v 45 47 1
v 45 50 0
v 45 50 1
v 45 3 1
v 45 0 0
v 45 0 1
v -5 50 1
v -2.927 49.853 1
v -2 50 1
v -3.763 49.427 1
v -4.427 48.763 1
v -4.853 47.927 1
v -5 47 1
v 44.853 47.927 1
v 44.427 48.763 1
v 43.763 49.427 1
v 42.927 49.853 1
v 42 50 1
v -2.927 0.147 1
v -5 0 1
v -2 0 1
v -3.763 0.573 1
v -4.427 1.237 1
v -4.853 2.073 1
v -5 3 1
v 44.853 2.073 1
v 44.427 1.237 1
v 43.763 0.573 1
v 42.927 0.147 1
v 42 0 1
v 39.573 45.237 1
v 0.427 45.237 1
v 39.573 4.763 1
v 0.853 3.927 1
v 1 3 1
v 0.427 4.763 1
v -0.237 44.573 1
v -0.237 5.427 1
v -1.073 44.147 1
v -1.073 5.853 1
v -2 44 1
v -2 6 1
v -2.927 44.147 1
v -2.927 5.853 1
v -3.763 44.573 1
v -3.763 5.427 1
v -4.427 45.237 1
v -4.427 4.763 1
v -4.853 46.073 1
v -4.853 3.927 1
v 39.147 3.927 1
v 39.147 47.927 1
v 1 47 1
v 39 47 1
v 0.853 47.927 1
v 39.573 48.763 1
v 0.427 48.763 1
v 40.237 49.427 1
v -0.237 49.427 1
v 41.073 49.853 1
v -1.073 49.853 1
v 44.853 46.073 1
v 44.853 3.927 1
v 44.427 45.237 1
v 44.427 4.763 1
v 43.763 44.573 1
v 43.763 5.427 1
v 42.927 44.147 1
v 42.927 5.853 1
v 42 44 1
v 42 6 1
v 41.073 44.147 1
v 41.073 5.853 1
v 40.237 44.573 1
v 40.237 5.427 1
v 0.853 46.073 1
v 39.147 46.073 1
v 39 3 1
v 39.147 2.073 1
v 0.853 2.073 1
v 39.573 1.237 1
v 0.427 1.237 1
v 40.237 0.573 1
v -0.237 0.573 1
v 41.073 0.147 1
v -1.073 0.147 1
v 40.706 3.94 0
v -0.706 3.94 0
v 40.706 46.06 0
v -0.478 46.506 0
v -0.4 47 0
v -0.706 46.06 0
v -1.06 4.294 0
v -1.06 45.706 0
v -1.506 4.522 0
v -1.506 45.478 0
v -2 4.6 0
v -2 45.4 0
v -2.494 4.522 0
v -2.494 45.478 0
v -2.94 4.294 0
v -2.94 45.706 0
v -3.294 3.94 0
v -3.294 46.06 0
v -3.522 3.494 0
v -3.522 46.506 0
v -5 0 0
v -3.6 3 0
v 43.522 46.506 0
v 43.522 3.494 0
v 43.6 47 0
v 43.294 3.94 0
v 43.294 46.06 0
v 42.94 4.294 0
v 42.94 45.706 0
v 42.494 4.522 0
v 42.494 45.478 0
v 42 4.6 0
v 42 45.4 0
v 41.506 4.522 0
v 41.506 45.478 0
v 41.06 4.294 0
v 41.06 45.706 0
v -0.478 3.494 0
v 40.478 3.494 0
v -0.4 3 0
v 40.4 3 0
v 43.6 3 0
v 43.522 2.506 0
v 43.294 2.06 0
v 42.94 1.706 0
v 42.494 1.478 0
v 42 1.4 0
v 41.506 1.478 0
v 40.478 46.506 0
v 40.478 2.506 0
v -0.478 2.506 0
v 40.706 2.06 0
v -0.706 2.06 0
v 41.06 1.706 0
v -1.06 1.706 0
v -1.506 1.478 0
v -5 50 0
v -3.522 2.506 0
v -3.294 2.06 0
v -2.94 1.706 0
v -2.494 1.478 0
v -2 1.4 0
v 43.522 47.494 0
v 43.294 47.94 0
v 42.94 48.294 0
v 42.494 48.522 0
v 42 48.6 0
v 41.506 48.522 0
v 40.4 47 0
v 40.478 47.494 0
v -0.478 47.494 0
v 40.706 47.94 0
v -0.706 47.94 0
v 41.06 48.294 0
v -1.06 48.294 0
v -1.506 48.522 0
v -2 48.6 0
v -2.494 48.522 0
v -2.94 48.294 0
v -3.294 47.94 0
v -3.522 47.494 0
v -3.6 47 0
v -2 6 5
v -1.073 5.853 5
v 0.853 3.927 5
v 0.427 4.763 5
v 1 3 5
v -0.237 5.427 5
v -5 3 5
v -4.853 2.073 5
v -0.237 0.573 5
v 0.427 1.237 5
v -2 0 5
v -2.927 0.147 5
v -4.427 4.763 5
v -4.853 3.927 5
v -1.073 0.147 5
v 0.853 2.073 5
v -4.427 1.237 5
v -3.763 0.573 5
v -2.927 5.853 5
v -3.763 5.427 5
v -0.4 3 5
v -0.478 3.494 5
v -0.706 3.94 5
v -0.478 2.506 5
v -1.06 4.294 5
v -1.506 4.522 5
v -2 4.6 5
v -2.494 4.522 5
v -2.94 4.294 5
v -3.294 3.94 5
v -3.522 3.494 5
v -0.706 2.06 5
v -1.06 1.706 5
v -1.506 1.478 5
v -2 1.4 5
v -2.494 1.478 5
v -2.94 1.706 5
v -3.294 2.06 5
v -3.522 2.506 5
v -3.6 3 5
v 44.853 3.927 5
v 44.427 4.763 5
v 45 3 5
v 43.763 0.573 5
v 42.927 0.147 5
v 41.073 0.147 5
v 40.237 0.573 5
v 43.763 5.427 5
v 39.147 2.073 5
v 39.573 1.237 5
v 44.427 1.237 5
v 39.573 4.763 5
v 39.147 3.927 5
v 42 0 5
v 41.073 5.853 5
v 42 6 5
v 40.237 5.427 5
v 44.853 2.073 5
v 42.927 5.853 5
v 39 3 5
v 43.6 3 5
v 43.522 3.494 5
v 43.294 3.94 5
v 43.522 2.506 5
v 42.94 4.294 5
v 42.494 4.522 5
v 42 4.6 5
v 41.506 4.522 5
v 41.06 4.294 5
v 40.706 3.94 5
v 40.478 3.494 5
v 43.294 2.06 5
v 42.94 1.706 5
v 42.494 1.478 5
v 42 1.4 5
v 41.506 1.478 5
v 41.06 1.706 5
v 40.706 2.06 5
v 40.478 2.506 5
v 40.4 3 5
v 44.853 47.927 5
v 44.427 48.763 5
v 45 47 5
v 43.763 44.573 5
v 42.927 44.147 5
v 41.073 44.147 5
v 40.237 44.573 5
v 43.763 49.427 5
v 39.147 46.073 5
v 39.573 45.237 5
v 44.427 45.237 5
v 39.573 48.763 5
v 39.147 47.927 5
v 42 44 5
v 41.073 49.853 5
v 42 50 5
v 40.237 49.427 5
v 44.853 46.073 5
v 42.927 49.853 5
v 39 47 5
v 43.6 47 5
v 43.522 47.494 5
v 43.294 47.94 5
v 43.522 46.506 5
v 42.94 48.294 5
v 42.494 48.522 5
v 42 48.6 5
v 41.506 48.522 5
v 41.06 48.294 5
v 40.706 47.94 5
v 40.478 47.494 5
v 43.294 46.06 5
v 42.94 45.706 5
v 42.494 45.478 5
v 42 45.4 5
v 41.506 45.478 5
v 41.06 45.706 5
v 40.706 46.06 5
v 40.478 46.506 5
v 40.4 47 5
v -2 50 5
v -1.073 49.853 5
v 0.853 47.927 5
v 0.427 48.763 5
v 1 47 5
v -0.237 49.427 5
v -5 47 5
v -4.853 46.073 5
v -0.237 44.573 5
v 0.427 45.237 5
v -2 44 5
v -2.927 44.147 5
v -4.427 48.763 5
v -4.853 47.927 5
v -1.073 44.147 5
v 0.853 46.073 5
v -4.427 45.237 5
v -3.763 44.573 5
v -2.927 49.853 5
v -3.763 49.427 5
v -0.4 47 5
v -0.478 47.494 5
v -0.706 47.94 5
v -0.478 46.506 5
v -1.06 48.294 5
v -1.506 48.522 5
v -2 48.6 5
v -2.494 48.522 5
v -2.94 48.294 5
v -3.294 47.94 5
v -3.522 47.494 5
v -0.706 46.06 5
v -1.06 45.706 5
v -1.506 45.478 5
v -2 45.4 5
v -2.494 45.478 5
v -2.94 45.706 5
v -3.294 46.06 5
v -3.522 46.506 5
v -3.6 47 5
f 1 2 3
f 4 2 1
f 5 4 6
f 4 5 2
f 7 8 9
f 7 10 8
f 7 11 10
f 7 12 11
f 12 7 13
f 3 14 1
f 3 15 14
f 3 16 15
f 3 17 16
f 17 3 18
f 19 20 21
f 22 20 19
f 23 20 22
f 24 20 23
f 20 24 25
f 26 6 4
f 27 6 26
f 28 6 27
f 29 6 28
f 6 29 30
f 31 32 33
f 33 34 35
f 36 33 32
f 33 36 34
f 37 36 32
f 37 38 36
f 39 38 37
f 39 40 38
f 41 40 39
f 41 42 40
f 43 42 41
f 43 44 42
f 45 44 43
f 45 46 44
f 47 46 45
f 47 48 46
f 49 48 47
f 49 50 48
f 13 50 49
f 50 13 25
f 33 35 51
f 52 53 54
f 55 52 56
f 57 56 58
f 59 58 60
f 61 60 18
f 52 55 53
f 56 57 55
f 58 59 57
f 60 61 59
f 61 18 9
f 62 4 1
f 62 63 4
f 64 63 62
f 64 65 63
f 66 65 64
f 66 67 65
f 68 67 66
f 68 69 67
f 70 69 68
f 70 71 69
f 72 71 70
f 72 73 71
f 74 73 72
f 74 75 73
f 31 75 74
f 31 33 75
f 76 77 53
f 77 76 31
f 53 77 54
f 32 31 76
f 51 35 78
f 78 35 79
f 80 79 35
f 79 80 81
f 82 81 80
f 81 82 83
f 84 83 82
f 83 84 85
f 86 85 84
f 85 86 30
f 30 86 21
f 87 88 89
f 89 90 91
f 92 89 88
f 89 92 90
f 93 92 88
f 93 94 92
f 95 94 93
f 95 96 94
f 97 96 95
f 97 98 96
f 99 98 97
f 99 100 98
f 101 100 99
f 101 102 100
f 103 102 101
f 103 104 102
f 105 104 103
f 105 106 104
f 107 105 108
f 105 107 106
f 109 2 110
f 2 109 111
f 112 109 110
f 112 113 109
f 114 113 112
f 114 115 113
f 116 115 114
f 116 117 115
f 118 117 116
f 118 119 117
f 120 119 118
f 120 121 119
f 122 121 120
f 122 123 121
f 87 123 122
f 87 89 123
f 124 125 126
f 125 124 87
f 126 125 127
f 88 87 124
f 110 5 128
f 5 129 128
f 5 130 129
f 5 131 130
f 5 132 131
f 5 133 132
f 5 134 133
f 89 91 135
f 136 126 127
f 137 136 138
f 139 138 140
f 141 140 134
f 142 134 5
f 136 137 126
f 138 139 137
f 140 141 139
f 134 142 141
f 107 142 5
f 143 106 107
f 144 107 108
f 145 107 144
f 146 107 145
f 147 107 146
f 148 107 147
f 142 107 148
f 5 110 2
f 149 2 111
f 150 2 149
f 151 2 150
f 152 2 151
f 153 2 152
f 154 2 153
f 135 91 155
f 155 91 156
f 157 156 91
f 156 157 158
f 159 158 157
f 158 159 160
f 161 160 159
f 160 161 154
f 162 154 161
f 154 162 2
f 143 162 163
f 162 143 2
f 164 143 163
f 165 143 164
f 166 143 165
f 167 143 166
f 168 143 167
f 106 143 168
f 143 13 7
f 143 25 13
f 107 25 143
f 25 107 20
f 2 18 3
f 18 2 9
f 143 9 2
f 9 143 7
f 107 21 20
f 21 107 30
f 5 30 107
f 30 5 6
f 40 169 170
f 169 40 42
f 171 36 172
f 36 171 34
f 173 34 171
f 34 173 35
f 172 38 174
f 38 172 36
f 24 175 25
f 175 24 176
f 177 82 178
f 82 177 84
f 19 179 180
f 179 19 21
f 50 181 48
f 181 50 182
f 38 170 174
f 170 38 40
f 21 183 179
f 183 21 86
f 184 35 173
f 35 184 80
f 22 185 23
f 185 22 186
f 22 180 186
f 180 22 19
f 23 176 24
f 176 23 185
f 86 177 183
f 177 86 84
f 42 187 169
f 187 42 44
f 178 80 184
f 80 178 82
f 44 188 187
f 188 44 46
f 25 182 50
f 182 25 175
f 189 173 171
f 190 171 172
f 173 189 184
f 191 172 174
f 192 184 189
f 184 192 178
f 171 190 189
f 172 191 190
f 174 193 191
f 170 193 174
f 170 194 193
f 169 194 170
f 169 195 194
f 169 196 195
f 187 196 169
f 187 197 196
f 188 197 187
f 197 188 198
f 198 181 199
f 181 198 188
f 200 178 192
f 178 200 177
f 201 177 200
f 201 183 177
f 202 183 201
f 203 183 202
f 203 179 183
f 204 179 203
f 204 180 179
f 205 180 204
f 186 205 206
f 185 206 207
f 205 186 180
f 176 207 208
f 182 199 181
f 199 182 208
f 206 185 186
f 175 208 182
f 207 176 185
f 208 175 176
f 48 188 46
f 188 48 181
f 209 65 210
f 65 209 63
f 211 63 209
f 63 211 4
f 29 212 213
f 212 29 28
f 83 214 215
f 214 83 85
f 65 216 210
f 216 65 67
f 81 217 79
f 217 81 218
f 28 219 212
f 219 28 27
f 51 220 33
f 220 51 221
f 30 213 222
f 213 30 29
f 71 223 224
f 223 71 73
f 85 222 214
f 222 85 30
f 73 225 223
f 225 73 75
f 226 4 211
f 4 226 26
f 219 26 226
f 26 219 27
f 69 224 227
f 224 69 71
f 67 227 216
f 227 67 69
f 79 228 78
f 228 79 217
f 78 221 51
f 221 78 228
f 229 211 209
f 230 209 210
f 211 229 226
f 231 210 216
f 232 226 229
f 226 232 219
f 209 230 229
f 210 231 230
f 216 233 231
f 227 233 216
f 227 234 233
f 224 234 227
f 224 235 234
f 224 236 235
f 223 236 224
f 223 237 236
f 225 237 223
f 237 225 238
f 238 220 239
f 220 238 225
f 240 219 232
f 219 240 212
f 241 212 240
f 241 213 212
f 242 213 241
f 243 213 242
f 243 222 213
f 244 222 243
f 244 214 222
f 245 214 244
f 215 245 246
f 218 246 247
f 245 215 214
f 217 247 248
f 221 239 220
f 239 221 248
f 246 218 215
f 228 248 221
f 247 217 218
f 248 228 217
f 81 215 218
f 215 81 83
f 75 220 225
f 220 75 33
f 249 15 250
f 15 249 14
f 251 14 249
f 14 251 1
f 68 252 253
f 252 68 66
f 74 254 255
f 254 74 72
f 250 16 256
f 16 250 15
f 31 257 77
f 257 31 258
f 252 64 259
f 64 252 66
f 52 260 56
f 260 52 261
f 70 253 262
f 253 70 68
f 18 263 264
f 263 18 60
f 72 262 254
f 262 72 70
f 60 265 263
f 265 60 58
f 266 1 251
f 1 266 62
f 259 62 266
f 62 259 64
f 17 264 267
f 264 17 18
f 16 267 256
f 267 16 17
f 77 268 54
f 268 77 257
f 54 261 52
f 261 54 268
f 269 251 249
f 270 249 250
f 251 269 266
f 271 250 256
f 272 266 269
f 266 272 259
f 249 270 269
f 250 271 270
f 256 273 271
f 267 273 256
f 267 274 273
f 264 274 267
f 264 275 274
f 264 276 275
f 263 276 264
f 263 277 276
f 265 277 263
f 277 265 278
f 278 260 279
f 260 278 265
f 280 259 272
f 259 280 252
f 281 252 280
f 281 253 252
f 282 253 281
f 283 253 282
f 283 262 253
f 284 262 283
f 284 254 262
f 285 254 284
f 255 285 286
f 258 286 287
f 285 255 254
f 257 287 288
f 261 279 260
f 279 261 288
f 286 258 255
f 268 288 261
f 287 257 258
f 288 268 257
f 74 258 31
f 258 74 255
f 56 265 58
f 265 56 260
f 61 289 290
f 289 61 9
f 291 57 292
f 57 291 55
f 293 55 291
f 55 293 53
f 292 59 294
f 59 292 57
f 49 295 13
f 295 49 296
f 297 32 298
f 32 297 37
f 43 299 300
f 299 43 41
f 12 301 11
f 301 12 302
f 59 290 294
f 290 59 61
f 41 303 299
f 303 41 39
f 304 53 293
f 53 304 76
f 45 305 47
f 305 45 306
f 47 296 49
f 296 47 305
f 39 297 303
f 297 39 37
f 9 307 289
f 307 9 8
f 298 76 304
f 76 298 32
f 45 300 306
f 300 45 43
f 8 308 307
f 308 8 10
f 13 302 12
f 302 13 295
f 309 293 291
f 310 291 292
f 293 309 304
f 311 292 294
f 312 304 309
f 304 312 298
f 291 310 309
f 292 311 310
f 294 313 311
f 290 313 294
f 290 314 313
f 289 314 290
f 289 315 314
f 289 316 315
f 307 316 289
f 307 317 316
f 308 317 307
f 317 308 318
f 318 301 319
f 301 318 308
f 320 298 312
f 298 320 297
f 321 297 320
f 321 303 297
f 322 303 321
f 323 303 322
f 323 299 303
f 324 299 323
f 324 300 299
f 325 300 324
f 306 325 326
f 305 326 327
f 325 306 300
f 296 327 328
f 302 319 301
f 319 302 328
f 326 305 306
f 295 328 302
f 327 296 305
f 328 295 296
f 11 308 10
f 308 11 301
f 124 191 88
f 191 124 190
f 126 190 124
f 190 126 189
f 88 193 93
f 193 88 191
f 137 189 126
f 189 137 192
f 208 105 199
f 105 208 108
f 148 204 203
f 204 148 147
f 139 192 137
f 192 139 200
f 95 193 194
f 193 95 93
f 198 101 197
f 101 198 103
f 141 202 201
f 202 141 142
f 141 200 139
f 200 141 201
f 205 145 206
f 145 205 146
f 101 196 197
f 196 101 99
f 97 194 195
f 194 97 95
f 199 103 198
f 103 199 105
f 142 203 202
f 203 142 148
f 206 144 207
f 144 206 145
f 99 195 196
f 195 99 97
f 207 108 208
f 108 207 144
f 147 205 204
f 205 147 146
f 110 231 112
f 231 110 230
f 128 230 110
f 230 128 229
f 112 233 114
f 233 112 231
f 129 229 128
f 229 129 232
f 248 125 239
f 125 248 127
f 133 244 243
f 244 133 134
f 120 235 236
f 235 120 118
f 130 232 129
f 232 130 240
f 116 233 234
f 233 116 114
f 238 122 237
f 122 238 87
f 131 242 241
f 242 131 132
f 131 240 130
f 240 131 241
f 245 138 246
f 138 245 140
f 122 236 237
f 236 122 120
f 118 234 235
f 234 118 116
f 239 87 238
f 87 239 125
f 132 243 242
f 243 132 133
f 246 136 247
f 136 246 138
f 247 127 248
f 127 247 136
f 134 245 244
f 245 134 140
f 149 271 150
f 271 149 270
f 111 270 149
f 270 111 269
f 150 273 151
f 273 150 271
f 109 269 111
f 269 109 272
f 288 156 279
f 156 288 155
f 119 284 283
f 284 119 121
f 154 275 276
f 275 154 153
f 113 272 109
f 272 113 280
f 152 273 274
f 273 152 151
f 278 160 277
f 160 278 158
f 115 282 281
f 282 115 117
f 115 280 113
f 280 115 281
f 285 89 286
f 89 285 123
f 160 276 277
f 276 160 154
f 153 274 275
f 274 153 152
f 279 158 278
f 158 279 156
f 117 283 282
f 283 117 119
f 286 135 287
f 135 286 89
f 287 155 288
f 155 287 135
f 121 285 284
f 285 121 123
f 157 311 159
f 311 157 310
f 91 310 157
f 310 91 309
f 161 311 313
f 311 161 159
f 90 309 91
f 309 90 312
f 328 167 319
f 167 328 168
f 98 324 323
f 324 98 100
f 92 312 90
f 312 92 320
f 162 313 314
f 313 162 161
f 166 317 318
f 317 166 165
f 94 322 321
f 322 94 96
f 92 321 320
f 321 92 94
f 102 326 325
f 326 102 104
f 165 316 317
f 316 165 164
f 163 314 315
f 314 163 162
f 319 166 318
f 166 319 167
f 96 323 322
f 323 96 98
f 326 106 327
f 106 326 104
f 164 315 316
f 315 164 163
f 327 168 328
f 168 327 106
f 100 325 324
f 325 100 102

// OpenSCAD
difference() {
    /*
    union() {
        translate([-5,0,0]) cube([50,50,1]);
        linear_extrude(1.8) import("rusty-bc250-atx-F_Cu_route.svg");
    }
    translate([0,0,-0.5]) linear_extrude(3) import("rusty-bc250-atx-F_Cu_drill.svg");
    */
    

    difference() {    
        union() {
            translate([-5,0,0]) cube([50,50,1]);
            translate([-2,3,0]) cylinder(h=5, r=3, $fn=20);
            translate([-2+44,3,0]) cylinder(h=5, r=3, $fn=20);
            #translate([-2+44,0+47,0]) cylinder(h=5, r=3, $fn=20);
            translate([-2,0+47,0]) cylinder(h=5, r=3, $fn=20);
        }
        translate([-2,3,-3]) cylinder(h=16, r=1.6, $fn=20);
        translate([-2+44,3,-3]) cylinder(h=16, r=1.6, $fn=20);
        #translate([-2+44,0+47,-3]) cylinder(h=16, r=1.6, $fn=20);
        translate([-2,0+47,-3]) cylinder(h=16, r=1.6, $fn=20);
    }
}
